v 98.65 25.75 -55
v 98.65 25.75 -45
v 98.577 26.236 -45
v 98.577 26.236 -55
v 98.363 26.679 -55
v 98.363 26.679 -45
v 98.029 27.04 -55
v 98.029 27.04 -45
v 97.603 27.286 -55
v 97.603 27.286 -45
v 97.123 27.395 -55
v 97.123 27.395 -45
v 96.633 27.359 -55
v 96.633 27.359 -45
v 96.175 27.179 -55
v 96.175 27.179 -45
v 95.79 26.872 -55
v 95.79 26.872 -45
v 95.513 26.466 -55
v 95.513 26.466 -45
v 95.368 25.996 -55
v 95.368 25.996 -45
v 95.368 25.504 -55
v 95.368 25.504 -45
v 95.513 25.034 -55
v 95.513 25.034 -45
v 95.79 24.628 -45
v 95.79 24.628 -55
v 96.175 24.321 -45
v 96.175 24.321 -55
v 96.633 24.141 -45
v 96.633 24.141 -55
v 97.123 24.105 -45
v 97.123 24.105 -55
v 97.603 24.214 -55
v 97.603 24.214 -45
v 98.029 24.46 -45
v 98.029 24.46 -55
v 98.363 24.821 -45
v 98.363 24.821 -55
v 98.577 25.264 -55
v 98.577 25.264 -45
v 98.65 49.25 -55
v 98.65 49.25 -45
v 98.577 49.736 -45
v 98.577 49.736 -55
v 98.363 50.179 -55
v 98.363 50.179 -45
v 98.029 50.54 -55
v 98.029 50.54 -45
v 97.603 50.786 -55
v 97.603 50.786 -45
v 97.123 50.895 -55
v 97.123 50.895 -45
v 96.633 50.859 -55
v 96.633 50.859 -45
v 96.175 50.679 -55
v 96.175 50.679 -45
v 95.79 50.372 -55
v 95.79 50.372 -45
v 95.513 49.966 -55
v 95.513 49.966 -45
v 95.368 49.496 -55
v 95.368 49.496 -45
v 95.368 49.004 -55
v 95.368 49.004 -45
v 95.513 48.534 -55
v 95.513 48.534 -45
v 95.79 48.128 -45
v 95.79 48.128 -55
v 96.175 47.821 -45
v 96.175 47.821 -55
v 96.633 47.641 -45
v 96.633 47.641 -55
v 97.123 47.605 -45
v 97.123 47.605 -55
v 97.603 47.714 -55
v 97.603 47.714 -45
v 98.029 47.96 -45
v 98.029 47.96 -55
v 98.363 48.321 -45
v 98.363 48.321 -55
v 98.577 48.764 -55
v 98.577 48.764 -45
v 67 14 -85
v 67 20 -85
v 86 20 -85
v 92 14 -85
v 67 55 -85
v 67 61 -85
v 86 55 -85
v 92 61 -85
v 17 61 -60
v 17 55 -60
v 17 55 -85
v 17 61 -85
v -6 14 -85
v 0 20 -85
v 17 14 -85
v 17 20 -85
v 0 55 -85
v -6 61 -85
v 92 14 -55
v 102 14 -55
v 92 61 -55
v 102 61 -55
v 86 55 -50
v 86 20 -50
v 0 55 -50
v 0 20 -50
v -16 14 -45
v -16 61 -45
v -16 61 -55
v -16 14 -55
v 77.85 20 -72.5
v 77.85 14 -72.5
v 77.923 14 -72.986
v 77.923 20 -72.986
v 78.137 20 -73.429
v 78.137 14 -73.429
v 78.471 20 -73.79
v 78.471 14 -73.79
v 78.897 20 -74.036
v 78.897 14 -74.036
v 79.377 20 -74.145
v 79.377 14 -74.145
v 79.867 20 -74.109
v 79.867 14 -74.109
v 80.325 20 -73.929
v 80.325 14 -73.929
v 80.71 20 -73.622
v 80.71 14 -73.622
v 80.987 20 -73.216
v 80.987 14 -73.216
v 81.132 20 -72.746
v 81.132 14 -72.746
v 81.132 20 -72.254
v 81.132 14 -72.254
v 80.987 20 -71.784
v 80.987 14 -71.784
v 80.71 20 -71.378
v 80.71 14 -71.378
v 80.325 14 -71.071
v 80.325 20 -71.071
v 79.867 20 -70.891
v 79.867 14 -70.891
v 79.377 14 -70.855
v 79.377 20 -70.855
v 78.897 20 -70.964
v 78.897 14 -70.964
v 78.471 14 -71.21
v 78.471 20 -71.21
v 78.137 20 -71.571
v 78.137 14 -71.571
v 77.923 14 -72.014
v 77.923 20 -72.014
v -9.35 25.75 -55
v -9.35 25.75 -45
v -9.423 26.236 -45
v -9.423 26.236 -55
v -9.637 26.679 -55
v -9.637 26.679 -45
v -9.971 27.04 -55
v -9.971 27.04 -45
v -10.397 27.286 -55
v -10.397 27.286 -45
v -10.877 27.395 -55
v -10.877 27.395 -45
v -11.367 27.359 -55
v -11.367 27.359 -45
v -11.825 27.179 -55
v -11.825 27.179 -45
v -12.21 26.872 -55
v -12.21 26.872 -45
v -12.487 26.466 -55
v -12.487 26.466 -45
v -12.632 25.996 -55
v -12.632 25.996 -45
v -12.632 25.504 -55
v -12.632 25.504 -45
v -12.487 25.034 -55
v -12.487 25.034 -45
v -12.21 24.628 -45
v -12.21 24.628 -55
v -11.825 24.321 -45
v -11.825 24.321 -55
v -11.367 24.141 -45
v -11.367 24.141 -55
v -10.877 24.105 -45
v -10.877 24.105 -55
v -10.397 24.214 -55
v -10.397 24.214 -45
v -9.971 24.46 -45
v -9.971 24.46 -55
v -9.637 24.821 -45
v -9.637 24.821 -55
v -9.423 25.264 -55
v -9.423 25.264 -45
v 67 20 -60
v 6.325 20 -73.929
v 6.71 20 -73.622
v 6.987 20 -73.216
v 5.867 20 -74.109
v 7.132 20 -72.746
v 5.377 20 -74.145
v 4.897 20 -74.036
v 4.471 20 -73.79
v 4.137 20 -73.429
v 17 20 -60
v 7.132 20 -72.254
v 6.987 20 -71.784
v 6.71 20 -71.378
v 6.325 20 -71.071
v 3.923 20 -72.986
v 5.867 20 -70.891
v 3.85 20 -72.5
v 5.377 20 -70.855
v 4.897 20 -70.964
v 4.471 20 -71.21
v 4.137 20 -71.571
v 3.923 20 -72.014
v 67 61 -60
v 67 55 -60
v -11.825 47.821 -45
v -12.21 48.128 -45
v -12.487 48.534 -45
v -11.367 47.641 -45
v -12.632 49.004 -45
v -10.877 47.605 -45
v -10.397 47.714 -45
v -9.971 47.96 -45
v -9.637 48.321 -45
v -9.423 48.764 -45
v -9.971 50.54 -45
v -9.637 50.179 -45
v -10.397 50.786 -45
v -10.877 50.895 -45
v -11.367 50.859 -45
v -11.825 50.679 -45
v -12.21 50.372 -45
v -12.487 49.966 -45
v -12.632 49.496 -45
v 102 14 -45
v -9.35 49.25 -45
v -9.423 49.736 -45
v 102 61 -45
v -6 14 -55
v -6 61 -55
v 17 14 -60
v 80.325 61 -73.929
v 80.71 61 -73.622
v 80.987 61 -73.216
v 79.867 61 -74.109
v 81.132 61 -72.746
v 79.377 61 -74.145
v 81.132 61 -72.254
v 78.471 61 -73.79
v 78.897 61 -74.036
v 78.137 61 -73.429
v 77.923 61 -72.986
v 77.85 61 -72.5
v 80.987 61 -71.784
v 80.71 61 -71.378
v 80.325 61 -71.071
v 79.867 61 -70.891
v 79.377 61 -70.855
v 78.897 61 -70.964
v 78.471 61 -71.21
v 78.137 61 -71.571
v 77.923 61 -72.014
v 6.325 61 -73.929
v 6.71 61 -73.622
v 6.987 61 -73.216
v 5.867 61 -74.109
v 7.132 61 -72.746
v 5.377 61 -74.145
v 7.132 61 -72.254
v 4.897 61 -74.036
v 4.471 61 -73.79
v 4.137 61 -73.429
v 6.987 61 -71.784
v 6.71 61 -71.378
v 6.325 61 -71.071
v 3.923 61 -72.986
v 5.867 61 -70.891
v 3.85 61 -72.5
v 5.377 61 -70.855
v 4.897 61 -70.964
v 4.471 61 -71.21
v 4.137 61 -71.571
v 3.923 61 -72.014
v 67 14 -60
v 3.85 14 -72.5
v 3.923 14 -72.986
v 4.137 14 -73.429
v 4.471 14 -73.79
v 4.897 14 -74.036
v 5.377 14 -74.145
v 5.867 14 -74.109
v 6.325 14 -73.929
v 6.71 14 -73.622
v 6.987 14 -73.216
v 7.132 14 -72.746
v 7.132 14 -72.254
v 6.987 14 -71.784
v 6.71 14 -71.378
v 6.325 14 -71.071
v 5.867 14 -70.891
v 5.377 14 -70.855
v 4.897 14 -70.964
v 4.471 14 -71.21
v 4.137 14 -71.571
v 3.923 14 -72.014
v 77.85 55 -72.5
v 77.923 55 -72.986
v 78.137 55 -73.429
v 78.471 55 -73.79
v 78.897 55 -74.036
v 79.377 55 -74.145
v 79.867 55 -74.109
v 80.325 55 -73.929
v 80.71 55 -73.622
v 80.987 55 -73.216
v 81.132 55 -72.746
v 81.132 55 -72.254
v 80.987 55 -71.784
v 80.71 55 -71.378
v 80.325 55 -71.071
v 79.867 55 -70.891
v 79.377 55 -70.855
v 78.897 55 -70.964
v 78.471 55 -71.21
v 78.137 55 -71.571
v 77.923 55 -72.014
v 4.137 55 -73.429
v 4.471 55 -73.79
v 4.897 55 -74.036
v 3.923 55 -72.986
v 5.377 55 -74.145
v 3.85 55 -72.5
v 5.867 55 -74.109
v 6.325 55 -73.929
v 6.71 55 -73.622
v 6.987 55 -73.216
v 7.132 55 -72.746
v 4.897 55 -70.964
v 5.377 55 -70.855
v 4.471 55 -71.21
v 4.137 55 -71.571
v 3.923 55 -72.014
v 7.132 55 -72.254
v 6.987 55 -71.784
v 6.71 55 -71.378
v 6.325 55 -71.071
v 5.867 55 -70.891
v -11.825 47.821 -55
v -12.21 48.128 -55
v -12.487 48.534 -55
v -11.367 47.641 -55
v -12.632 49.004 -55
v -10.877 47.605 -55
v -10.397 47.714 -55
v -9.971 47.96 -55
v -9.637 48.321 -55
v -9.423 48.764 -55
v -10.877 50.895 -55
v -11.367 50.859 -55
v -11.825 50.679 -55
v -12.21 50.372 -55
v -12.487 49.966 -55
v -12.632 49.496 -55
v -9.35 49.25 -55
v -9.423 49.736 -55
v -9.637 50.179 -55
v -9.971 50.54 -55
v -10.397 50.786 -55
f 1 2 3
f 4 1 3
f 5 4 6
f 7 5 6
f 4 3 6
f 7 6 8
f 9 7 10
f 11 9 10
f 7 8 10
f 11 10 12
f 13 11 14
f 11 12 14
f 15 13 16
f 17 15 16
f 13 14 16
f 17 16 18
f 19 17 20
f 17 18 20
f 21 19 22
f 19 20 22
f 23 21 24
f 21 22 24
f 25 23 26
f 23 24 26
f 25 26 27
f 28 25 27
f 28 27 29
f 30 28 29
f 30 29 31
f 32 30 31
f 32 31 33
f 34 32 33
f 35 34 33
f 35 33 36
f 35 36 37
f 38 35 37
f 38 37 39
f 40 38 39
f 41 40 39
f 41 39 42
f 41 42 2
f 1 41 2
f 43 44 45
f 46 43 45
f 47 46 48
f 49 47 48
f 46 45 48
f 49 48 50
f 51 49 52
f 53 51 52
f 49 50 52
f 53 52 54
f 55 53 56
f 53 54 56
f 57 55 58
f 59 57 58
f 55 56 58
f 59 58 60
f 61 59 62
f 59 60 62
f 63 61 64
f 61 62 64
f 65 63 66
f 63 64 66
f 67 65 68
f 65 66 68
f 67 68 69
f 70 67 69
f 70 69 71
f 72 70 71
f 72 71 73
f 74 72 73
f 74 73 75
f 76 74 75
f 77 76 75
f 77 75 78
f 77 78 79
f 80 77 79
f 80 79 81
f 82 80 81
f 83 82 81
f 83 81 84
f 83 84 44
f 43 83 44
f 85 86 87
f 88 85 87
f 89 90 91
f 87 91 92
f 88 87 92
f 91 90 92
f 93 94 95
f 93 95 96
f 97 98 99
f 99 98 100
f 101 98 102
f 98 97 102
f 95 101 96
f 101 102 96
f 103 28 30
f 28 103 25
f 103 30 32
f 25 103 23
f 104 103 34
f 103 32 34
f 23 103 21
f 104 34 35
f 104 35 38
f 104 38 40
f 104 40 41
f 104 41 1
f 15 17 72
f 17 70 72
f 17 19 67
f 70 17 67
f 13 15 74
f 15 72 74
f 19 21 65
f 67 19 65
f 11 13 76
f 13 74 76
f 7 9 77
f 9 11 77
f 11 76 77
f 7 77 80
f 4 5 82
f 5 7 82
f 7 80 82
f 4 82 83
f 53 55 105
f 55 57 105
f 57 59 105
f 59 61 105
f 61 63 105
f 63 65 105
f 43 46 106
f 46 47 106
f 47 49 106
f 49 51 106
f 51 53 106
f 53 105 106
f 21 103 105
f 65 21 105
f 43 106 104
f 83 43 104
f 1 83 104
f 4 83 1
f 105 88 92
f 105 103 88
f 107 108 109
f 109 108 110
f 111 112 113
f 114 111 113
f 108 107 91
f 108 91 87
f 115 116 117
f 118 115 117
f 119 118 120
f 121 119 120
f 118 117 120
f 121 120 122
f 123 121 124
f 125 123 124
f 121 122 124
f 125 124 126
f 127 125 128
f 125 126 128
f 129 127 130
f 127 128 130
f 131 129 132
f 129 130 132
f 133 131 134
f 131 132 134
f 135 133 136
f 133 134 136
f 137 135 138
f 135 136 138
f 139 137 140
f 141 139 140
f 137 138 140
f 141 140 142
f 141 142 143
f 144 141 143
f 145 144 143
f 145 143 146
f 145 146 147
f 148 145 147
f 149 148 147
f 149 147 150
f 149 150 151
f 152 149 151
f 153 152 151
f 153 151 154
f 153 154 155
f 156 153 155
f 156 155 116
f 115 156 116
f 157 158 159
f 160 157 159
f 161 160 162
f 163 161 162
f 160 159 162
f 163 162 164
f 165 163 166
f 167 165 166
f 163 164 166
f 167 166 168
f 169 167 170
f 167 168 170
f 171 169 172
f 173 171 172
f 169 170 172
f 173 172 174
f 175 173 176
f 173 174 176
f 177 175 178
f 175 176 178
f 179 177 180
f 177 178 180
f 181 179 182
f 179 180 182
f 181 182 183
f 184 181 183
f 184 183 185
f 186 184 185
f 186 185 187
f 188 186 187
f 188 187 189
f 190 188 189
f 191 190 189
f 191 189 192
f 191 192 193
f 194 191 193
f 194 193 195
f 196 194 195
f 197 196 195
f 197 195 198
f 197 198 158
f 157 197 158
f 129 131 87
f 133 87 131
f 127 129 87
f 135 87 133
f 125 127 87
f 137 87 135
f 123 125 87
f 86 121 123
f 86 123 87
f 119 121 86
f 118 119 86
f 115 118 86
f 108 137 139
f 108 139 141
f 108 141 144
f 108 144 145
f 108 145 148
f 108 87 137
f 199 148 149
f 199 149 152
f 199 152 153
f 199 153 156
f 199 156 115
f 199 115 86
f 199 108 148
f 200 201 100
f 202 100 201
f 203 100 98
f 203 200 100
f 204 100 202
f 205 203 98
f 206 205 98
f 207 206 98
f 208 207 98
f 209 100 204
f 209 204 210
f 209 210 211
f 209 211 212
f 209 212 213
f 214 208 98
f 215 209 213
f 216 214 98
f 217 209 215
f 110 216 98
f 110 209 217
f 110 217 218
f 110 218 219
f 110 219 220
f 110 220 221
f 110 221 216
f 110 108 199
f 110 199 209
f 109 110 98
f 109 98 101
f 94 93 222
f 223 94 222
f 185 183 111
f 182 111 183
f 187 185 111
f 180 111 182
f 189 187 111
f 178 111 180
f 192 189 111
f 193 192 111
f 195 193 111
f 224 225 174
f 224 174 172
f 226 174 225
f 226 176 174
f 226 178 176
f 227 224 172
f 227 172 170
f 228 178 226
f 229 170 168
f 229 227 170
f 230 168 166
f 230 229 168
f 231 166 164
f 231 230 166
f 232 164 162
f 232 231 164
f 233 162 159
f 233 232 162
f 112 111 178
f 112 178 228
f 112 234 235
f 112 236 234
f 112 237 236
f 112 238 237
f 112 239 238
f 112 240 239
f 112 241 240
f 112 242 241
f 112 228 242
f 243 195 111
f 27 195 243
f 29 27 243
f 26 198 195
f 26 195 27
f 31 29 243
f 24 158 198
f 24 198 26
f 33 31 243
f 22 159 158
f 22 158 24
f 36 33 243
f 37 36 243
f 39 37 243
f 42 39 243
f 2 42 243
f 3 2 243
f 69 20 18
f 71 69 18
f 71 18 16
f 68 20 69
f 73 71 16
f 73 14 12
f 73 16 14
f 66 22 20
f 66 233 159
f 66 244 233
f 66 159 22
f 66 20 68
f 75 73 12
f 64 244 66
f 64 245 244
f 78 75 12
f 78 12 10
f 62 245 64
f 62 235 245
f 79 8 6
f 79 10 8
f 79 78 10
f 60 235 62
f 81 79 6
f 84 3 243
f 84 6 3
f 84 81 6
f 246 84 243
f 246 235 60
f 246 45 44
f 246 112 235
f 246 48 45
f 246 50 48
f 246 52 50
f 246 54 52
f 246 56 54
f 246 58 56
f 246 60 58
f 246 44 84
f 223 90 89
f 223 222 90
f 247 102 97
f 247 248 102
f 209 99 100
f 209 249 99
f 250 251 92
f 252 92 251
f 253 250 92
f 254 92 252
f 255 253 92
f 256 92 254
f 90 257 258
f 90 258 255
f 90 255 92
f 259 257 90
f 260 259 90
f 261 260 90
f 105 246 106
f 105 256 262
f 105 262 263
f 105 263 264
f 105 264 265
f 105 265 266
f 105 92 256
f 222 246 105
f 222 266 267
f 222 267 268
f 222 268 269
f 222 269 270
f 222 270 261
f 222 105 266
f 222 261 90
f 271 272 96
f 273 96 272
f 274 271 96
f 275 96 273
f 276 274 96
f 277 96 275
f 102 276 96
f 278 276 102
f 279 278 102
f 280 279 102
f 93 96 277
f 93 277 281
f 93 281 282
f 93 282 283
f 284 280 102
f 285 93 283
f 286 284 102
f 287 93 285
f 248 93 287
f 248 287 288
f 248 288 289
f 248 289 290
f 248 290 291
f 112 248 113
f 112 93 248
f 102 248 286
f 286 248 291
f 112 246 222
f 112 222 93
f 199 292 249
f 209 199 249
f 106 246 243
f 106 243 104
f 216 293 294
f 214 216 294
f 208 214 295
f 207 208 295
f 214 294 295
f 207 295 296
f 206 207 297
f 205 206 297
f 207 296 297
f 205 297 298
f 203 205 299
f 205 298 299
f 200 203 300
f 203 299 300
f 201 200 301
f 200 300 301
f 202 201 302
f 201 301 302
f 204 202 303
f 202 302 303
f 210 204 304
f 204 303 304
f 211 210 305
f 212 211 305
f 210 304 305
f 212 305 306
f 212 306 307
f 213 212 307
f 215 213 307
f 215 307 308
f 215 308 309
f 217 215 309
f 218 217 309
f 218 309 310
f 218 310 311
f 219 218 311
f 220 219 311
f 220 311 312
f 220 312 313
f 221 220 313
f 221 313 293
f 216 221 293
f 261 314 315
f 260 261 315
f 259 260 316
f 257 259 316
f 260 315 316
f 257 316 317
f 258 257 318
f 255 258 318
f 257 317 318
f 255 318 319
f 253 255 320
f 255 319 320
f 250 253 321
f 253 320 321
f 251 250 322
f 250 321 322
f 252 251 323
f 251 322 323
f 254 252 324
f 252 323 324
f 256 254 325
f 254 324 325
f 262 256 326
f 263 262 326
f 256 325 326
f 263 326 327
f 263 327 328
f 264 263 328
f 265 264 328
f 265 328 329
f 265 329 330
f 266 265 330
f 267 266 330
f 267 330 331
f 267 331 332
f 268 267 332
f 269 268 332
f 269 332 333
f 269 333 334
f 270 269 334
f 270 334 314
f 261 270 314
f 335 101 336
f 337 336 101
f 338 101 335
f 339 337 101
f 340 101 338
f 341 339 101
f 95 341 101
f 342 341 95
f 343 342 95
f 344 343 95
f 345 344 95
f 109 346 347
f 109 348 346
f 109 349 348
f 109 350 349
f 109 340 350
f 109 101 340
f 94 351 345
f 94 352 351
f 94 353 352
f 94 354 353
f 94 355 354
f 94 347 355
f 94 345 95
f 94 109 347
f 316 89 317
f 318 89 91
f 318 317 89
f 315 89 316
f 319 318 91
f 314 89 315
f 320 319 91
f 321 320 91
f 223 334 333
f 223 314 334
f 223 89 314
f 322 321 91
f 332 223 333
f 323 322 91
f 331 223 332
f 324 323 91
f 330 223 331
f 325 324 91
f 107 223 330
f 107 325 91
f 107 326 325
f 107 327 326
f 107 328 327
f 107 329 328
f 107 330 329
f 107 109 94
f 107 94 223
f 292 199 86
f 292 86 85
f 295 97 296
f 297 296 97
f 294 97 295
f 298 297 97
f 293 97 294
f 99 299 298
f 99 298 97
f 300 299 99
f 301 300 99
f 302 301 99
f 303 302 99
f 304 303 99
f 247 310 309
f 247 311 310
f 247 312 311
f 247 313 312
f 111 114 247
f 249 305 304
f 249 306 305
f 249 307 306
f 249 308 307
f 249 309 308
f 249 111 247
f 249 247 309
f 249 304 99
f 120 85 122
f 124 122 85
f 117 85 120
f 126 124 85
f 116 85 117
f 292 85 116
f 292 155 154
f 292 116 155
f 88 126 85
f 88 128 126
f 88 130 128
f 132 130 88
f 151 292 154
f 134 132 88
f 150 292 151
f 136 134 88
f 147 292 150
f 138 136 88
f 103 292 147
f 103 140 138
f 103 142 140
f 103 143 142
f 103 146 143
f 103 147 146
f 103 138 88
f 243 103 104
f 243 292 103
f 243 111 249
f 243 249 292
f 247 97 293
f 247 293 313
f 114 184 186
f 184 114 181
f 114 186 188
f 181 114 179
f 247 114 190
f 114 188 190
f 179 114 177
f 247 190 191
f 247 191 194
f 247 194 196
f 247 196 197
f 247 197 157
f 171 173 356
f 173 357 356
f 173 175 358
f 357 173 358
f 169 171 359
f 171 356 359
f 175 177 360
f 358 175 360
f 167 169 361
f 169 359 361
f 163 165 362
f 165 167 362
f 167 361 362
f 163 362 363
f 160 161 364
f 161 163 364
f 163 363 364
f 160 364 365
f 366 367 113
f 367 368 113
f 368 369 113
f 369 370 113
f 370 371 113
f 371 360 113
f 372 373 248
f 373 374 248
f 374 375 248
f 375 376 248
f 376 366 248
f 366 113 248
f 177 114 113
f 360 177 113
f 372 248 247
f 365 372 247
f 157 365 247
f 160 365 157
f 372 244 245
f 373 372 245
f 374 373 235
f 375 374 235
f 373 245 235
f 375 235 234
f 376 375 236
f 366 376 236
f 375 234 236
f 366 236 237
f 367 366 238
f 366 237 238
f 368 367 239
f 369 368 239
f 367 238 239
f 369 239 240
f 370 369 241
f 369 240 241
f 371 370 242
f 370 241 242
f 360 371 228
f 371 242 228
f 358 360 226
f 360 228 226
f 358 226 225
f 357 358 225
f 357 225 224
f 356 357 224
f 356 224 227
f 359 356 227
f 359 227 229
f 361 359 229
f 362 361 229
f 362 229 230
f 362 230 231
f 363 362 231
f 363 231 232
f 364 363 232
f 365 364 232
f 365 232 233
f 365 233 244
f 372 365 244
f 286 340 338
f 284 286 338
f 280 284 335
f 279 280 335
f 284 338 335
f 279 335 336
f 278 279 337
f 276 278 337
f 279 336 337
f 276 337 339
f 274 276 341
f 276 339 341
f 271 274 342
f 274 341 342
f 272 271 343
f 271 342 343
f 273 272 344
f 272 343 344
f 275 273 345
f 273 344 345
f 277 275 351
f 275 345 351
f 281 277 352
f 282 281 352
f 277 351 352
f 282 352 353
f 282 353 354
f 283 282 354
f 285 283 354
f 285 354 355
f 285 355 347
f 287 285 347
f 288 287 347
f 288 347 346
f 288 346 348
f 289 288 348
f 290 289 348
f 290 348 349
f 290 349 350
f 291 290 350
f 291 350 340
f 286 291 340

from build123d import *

# Parameters (mm, degrees)
BOSS_EXTRUDE2_DEPTH    = 75
SKETCH3_W              = 20
SKETCH3_H              = 10
BOSS_EXTRUDE3_DEPTH    = 75
SKETCH4_W              = 50
SKETCH4_H              = 25
CUT_EXTRUDE1_DEPTH     = 75
SKETCH5_W              = 50
SKETCH5_H              = 28
CUT_EXTRUDE2_DEPTH     = 75
SKETCH6_W              = 19
SKETCH6_H              = 35
CUT_EXTRUDE3_DEPTH     = 25
CUT_EXTRUDE4_DEPTH     = 14
CUT_EXTRUDE5_DEPTH     = 14
SKETCH24_W             = 50
SKETCH24_H             = 10
BOSS_EXTRUDE4_DEPTH    = 6
SKETCH25_W             = 50
SKETCH25_H             = 10
BOSS_EXTRUDE5_DEPTH    = 6
CUT_EXTRUDE7_DEPTH     = 143.751532391
SKETCH33_W             = 10
SKETCH33_H             = 10
BOSS_EXTRUDE6_DEPTH    = 47
M4X0_7_TAPPED_HOLE8_D  = 3.3
M4X0_7_TAPPED_HOLE9_D  = 3.3
M4X0_7_TAPPED_HOLE10_D = 3.3
M4X0_7_TAPPED_HOLE11_D = 3.3
BOSS_EXTRUDE7_DEPTH    = 10
BOSS_EXTRUDE8_DEPTH    = 10
M4X0_7_TAPPED_HOLE12_D = 3.3
M4X0_7_TAPPED_HOLE13_D = 3.3


with BuildPart() as part:
    # Sketch2 → Boss-Extrude2 (new body)
    with BuildSketch(Plane(origin=(0, 0, 0), x_dir=(1, 0, 0), z_dir=(0, 1, 0))):
        Polygon((-6, 69), (-6, 0), (-6, -6), (0, -6), (86, -6), (92, -6), (92, 0), (92, 69), (92, 75), (86, 75), (0, 75), (-6, 75), align=None)
    extrude(amount=BOSS_EXTRUDE2_DEPTH)

    # Sketch3 → Boss-Extrude3 (add)
    with BuildSketch(Plane(origin=(0, 0, 0), x_dir=(-1, 0, 0), z_dir=(0, -1, 0))):
        with Locations((-102, -1)):
            Rectangle(SKETCH3_W, SKETCH3_H)
        with Locations((16, -1)):
            Rectangle(SKETCH3_W, SKETCH3_H)
    extrude(amount=-BOSS_EXTRUDE3_DEPTH)

    # Sketch4 → Cut-Extrude1 (cut)
    with BuildSketch(Plane(origin=(0, 0, 0), x_dir=(-1, 0, 0), z_dir=(0, -1, 0))):
        with Locations((-42, 62.5)):
            Rectangle(SKETCH4_W, SKETCH4_H)
    extrude(amount=-CUT_EXTRUDE1_DEPTH, mode=Mode.SUBTRACT)

    # Sketch5 → Cut-Extrude2 (cut)
    with BuildSketch(Plane(origin=(0, 0, 0), x_dir=(-1, 0, 0), z_dir=(0, -1, 0))):
        with Locations((-42, 8)):
            Rectangle(SKETCH5_W, SKETCH5_H)
    extrude(amount=-CUT_EXTRUDE2_DEPTH, mode=Mode.SUBTRACT)

    # Sketch6 → Cut-Extrude3 (cut)
    with BuildSketch(Plane(origin=(0, 0, -75), x_dir=(-1, 0, 0), z_dir=(0, 0, -1))):
        with Locations((-76.5, 37.5)):
            Rectangle(SKETCH6_W, SKETCH6_H)
        Polygon((-67, 55), (-67, 20), (0, 20), (0, 37.5), (0, 55), align=None)
    extrude(amount=-CUT_EXTRUDE3_DEPTH, mode=Mode.SUBTRACT)

    # Sketch7 → Cut-Extrude4 (cut)
    with BuildSketch(Plane(origin=(0, 0, 0), x_dir=(-1, 0, 0), z_dir=(0, -1, 0))):
        Polygon((-112, 4), (-112, -6), (-67, -6), (-67, 22), (-17, 22), (-17, -6), (26, -6), (26, 4), (6, 4), (6, 75), (-17, 75), (-17, 50), (-67, 50), (-67, 75), (-92, 75), (-92, 4), align=None)
    extrude(amount=-CUT_EXTRUDE4_DEPTH, mode=Mode.SUBTRACT)

    # Sketch8 → Cut-Extrude5 (cut)
    with BuildSketch(Plane(origin=(0, 75, 0), x_dir=(1, 0, 0), z_dir=(0, 1, 0))):
        Polygon((-26, 4), (-6, 4), (-6, 75), (17, 75), (17, 50), (67, 50), (67, 75), (92, 75), (92, 4), (112, 4), (112, -6), (67, -6), (67, 22), (17, 22), (17, -6), (-26, -6), align=None)
    extrude(amount=-CUT_EXTRUDE5_DEPTH, mode=Mode.SUBTRACT)

    # Sketch24 → Boss-Extrude4 (add)
    with BuildSketch(Plane(origin=(0, 14, 0), x_dir=(-1, 0, 0), z_dir=(0, -1, 0))):
        with Locations((-42, 55)):
            Rectangle(SKETCH24_W, SKETCH24_H)
    extrude(amount=-BOSS_EXTRUDE4_DEPTH)

    # Sketch25 → Boss-Extrude5 (add)
    with BuildSketch(Plane(origin=(0, 61, 0), x_dir=(1, 0, 0), z_dir=(0, 1, 0))):
        with Locations((42, 55)):
            Rectangle(SKETCH25_W, SKETCH25_H)
    extrude(amount=-BOSS_EXTRUDE5_DEPTH)

    # Sketch31 → Cut-Extrude7 (cut, through all)
    with BuildSketch(Plane(origin=(0, 61, 0), x_dir=(1, 0, 0), z_dir=(0, 1, 0))):
        Polygon((-6, 45), (92, 45), (112, 45), (112, -6), (92, -6), (-6, -6), (-26, -6), (-26, 45), align=None)
    extrude(amount=-CUT_EXTRUDE7_DEPTH, mode=Mode.SUBTRACT)

    # Sketch33 → Boss-Extrude6 (add, through all)
    with BuildSketch(Plane(origin=(0, 61, 0), x_dir=(1, 0, 0), z_dir=(0, 1, 0))):
        with Locations((-11, 50)):
            Rectangle(SKETCH33_W, SKETCH33_H)
        with Locations((97, 50)):
            Rectangle(SKETCH33_W, SKETCH33_H)
    extrude(amount=-BOSS_EXTRUDE6_DEPTH)

    # M4x0.7 Tapped Hole8 (through all)
    with Locations(Plane(origin=(0, 0, -55), x_dir=(-1, 0, 0), z_dir=(0, 0, -1))):
        with Locations((11, 25.75)):
            Hole(M4X0_7_TAPPED_HOLE8_D / 2)

    # M4x0.7 Tapped Hole9 (through all)
    with Locations(Plane(origin=(0, 0, -55), x_dir=(-1, 0, 0), z_dir=(0, 0, -1))):
        with Locations((11, 49.25)):
            Hole(M4X0_7_TAPPED_HOLE9_D / 2)

    # M4x0.7 Tapped Hole10 (through all)
    with Locations(Plane(origin=(0, 0, -55), x_dir=(-1, 0, 0), z_dir=(0, 0, -1))):
        with Locations((-97, 49.25)):
            Hole(M4X0_7_TAPPED_HOLE10_D / 2)

    # M4x0.7 Tapped Hole11 (through all)
    with Locations(Plane(origin=(0, 0, -55), x_dir=(-1, 0, 0), z_dir=(0, 0, -1))):
        with Locations((-97, 25.75)):
            Hole(M4X0_7_TAPPED_HOLE11_D / 2)

    # Sketch44 → Boss-Extrude7 (add)
    with BuildSketch(Plane(origin=(0, 20, -75), x_dir=(-1, 0, 0), z_dir=(0, 0, -1))):
        Polygon((-17, -6), (-17, 0), (0, 0), (0, 35), (-17, 35), (-17, 41), (6, 41), (6, -6), align=None)
    extrude(amount=BOSS_EXTRUDE7_DEPTH)

    # Sketch45 → Boss-Extrude8 (add)
    with BuildSketch(Plane(origin=(0, 0, -75), x_dir=(-1, 0, 0), z_dir=(0, 0, -1))):
        Polygon((-67, 61), (-67, 55), (-86, 55), (-86, 20), (-67, 20), (-67, 14), (-92, 14), (-92, 61), align=None)
    extrude(amount=BOSS_EXTRUDE8_DEPTH)

    # M4x0.7 Tapped Hole12 (through all)
    with Locations(Plane(origin=(0, 61, 0), x_dir=(1, 0, 0), z_dir=(0, 1, 0))):
        with Locations((5.5, 72.5)):
            Hole(M4X0_7_TAPPED_HOLE12_D / 2)

    # M4x0.7 Tapped Hole13 (through all)
    with Locations(Plane(origin=(0, 61, 0), x_dir=(1, 0, 0), z_dir=(0, 1, 0))):
        with Locations((79.5, 72.5)):
            Hole(M4X0_7_TAPPED_HOLE13_D / 2)


solid = part.part
